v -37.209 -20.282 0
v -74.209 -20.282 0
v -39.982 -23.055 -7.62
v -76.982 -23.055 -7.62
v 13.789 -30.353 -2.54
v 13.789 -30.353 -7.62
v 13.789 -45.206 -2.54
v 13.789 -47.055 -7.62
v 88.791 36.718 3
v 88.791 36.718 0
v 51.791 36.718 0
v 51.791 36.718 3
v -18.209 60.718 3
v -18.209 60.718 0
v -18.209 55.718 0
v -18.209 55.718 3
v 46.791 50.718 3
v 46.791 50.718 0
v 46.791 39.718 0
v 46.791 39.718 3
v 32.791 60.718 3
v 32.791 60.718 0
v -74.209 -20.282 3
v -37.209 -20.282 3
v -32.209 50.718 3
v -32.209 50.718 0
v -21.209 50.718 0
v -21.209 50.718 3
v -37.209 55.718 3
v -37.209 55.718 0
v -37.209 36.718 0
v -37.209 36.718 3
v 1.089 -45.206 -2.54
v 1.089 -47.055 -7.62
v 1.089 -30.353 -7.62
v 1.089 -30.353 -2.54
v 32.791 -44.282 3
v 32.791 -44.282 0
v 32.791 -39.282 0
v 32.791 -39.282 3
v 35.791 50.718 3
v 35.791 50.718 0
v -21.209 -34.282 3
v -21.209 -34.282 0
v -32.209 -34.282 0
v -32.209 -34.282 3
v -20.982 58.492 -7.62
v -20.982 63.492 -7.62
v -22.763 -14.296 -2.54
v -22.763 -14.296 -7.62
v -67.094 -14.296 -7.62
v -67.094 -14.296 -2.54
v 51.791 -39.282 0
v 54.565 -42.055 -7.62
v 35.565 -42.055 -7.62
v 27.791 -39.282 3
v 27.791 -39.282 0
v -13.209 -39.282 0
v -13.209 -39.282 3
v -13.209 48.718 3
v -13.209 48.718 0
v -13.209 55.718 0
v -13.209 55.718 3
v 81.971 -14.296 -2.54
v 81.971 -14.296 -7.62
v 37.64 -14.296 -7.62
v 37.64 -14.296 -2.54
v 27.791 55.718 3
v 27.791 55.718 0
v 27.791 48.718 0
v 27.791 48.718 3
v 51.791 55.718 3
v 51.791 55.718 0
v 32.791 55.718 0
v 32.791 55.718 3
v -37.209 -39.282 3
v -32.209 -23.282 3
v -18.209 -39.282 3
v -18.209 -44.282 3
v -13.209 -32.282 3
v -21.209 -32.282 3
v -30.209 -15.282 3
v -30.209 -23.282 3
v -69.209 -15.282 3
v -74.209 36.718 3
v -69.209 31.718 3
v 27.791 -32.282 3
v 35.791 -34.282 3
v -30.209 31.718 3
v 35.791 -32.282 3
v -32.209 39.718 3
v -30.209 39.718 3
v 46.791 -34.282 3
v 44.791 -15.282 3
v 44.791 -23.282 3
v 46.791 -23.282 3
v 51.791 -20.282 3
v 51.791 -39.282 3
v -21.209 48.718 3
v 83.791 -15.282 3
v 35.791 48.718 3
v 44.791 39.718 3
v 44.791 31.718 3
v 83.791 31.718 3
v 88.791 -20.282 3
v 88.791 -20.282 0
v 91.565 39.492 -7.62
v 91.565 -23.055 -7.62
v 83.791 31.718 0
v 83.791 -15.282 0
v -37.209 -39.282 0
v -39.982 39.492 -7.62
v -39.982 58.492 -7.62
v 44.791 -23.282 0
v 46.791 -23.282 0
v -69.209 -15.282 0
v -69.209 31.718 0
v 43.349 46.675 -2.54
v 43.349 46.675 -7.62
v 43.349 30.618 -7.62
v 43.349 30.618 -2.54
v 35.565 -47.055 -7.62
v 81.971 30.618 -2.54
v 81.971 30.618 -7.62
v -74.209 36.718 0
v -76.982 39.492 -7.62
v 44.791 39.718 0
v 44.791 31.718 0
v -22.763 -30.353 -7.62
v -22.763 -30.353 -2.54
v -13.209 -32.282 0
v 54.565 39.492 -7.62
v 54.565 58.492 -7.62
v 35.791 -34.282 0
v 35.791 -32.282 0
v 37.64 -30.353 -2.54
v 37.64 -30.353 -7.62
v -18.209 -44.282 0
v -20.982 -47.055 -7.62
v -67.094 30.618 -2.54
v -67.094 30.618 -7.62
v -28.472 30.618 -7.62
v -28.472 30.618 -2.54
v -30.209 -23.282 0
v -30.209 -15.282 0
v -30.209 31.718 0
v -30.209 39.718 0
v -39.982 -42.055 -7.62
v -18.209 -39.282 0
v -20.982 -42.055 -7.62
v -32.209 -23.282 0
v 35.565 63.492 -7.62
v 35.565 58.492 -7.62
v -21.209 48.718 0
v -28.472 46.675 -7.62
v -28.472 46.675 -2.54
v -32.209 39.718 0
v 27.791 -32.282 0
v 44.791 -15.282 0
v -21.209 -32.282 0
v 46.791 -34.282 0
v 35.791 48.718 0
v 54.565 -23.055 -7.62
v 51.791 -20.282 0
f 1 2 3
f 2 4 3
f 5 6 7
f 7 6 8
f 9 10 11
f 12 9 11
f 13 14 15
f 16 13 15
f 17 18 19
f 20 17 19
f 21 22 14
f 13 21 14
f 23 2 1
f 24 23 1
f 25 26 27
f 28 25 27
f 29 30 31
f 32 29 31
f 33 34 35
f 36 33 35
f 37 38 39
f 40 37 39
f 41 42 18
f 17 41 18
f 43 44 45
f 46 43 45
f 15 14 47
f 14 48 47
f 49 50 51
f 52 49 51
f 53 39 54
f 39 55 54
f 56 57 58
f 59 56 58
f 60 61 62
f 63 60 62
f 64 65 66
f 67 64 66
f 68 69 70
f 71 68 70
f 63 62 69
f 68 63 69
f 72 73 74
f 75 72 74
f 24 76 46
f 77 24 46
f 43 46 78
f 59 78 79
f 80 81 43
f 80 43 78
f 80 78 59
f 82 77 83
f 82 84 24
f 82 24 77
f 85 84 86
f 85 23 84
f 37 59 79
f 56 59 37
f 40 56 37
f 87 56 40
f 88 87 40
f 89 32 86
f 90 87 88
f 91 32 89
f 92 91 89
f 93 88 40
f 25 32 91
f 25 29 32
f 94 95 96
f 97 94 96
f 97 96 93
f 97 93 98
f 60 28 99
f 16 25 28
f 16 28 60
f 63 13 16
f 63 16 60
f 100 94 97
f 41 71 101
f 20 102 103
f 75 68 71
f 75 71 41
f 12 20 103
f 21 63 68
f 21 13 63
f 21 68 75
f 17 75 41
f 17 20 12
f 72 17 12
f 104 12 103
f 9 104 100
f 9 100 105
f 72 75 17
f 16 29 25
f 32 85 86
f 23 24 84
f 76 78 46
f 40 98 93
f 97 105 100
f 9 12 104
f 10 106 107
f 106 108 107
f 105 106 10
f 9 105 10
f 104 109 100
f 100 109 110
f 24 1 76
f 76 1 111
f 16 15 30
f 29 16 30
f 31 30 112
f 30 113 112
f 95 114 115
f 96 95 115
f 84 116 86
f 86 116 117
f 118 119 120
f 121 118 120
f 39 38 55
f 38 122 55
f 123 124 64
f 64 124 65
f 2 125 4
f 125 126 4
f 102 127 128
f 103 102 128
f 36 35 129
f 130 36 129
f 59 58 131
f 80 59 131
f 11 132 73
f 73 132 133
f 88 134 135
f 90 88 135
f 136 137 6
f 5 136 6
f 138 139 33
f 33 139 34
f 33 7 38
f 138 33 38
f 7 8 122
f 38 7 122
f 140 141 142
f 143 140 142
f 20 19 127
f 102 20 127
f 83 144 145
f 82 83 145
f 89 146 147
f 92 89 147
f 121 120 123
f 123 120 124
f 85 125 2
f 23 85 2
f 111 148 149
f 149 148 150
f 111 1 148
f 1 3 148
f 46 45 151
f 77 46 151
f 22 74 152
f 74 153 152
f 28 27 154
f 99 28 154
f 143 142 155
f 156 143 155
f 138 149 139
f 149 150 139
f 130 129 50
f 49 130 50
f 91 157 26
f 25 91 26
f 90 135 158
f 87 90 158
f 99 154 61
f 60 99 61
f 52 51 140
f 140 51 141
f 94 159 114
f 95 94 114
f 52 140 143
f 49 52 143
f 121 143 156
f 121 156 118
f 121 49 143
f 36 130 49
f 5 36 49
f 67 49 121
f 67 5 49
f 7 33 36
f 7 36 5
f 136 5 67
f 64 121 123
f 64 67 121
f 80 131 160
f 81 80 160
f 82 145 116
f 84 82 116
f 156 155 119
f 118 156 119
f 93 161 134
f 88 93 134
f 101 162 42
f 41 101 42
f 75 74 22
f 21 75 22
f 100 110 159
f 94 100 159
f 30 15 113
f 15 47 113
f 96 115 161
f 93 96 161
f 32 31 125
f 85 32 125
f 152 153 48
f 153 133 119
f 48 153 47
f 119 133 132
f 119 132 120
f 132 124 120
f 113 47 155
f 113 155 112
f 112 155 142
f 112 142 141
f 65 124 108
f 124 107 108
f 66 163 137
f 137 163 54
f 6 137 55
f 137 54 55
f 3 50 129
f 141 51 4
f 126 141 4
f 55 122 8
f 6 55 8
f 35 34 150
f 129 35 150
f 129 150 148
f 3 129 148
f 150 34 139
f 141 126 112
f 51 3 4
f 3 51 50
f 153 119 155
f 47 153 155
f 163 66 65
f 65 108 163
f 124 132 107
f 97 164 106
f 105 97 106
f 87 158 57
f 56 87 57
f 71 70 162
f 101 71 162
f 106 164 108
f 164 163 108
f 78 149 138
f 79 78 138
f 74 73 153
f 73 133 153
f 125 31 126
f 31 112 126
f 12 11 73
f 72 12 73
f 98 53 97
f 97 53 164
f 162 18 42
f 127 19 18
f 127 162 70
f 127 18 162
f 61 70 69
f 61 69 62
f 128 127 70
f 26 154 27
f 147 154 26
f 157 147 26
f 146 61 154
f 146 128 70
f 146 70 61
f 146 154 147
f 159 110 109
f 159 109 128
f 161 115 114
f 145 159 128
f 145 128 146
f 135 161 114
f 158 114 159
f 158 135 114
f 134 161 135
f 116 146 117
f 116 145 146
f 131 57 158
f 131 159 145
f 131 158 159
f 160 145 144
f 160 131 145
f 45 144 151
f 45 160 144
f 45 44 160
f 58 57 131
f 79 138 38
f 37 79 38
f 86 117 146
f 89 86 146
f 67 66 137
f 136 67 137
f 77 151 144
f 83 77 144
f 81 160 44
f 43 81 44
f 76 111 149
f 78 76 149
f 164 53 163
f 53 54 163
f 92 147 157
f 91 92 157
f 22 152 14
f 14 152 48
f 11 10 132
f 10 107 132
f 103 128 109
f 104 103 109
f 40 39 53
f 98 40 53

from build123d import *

# Parameters (mm, degrees)
F1_DEPTH = 3
F2_DEPTH = 7.62
F2_TAPER = -20
F4_DEPTH = 5.08


with BuildPart() as f1:
    # F0 (on Top) → F1 (new body)
    with BuildSketch(Plane.XY):
        Polygon((51.7914976329, 55.718055591), (32.7914976329, 55.718055591), (32.7914976329, 60.718055591), (7.2914976329, 60.718055591), (-18.2085023671, 60.718055591), (-18.2085023671, 55.718055591), (-37.2085023671, 55.718055591), (-37.2085023671, 36.718055591), (-74.2085023671, 36.718055591), (-74.2085023671, 8.218055591), (-74.2085023671, -20.281944409), (-37.2085023671, -20.281944409), (-37.2085023671, -39.281944409), (-18.2085023671, -39.281944409), (-18.2085023671, -44.281944409), (7.2914976329, -44.281944409), (32.7914976329, -44.281944409), (32.7914976329, -39.281944409), (51.7914976329, -39.281944409), (51.7914976329, -20.281944409), (88.7914976329, -20.281944409), (88.7914976329, 8.218055591), (88.7914976329, 36.718055591), (51.7914976329, 36.718055591), align=None)
        Polygon((-69.2085023671, 8.218055591), (-69.2085023671, 31.718055591), (-30.2085023671, 31.718055591), (-30.2085023671, 39.718055591), (-32.2085023671, 39.718055591), (-32.2085023671, 50.718055591), (-21.2085023671, 50.718055591), (-21.2085023671, 48.718055591), (-13.2085023671, 48.718055591), (-13.2085023671, 55.718055591), (7.2914976329, 55.718055591), (27.7914976329, 55.718055591), (27.7914976329, 48.718055591), (35.7914976329, 48.718055591), (35.7914976329, 50.718055591), (46.7914976329, 50.718055591), (46.7914976329, 39.718055591), (44.7914976329, 39.718055591), (44.7914976329, 31.718055591), (83.7914976329, 31.718055591), (83.7914976329, 8.218055591), (83.7914976329, -15.281944409), (44.7914976329, -15.281944409), (44.7914976329, -23.281944409), (46.7914976329, -23.281944409), (46.7914976329, -34.281944409), (35.7914976329, -34.281944409), (35.7914976329, -32.281944409), (27.7914976329, -32.281944409), (27.7914976329, -39.281944409), (7.2914976329, -39.281944409), (-13.2085023671, -39.281944409), (-13.2085023671, -32.281944409), (-21.2085023671, -32.281944409), (-21.2085023671, -34.281944409), (-32.2085023671, -34.281944409), (-32.2085023671, -23.281944409), (-30.2085023671, -23.281944409), (-30.2085023671, -15.281944409), (-69.2085023671, -15.281944409), align=None, mode=Mode.SUBTRACT)
    extrude(amount=F1_DEPTH)

    # F0 (on Top) → F2 (join)
    with BuildSketch(Plane.XY):
        Polygon((51.7914976329, 55.718055591), (32.7914976329, 55.718055591), (32.7914976329, 60.718055591), (7.2914976329, 60.718055591), (-18.2085023671, 60.718055591), (-18.2085023671, 55.718055591), (-37.2085023671, 55.718055591), (-37.2085023671, 36.718055591), (-74.2085023671, 36.718055591), (-74.2085023671, 8.218055591), (-74.2085023671, -20.281944409), (-37.2085023671, -20.281944409), (-37.2085023671, -39.281944409), (-18.2085023671, -39.281944409), (-18.2085023671, -44.281944409), (7.2914976329, -44.281944409), (32.7914976329, -44.281944409), (32.7914976329, -39.281944409), (51.7914976329, -39.281944409), (51.7914976329, -20.281944409), (88.7914976329, -20.281944409), (88.7914976329, 8.218055591), (88.7914976329, 36.718055591), (51.7914976329, 36.718055591), align=None)
        Polygon((-69.2085023671, 8.218055591), (-69.2085023671, 31.718055591), (-30.2085023671, 31.718055591), (-30.2085023671, 39.718055591), (-32.2085023671, 39.718055591), (-32.2085023671, 50.718055591), (-21.2085023671, 50.718055591), (-21.2085023671, 48.718055591), (-13.2085023671, 48.718055591), (-13.2085023671, 55.718055591), (7.2914976329, 55.718055591), (27.7914976329, 55.718055591), (27.7914976329, 48.718055591), (35.7914976329, 48.718055591), (35.7914976329, 50.718055591), (46.7914976329, 50.718055591), (46.7914976329, 39.718055591), (44.7914976329, 39.718055591), (44.7914976329, 31.718055591), (83.7914976329, 31.718055591), (83.7914976329, 8.218055591), (83.7914976329, -15.281944409), (44.7914976329, -15.281944409), (44.7914976329, -23.281944409), (46.7914976329, -23.281944409), (46.7914976329, -34.281944409), (35.7914976329, -34.281944409), (35.7914976329, -32.281944409), (27.7914976329, -32.281944409), (27.7914976329, -39.281944409), (7.2914976329, -39.281944409), (-13.2085023671, -39.281944409), (-13.2085023671, -32.281944409), (-21.2085023671, -32.281944409), (-21.2085023671, -34.281944409), (-32.2085023671, -34.281944409), (-32.2085023671, -23.281944409), (-30.2085023671, -23.281944409), (-30.2085023671, -15.281944409), (-69.2085023671, -15.281944409), align=None, mode=Mode.SUBTRACT)
        Polygon((-30.2085023671, 31.718055591), (-69.2085023671, 31.718055591), (-69.2085023671, 8.218055591), (-69.2085023671, -15.281944409), (-30.2085023671, -15.281944409), (-30.2085023671, -23.281944409), (-32.2085023671, -23.281944409), (-32.2085023671, -34.281944409), (-21.2085023671, -34.281944409), (-21.2085023671, -32.281944409), (-13.2085023671, -32.281944409), (-13.2085023671, -39.281944409), (7.2914976329, -39.281944409), (27.7914976329, -39.281944409), (27.7914976329, -32.281944409), (35.7914976329, -32.281944409), (35.7914976329, -34.281944409), (46.7914976329, -34.281944409), (46.7914976329, -23.281944409), (44.7914976329, -23.281944409), (44.7914976329, -15.281944409), (83.7914976329, -15.281944409), (83.7914976329, 8.218055591), (83.7914976329, 31.718055591), (44.7914976329, 31.718055591), (44.7914976329, 39.718055591), (46.7914976329, 39.718055591), (46.7914976329, 50.718055591), (35.7914976329, 50.718055591), (35.7914976329, 48.718055591), (27.7914976329, 48.718055591), (27.7914976329, 55.718055591), (7.2914976329, 55.718055591), (-13.2085023671, 55.718055591), (-13.2085023671, 48.718055591), (-21.2085023671, 48.718055591), (-21.2085023671, 50.718055591), (-32.2085023671, 50.718055591), (-32.2085023671, 39.718055591), (-30.2085023671, 39.718055591), align=None)
    extrude(amount=-F2_DEPTH, taper=F2_TAPER)

    # F3 (on face) → F4 (cut)
    with BuildSketch(Plane(origin=(0, 0, -7.62), x_dir=(1, 0, 0), z_dir=(0, 0, -1))):
        Polygon((-28.4716319293, 14.2964404076), (-67.0940428972, 14.2964404076), (-67.0940428972, -30.6183788925), (-28.4716319293, -30.6183788925), (-28.4716319293, -46.6748848557), (43.3486886322, -46.6748848557), (43.3486886322, -30.6183788925), (81.9710996002, -30.6183788925), (81.9710996002, 14.2964404076), (43.3486886322, 14.2964404076), (37.6397153199, 14.2964404076), (37.6397153199, 30.3529463708), (13.7885283515, 30.3529463708), (13.7885283515, 47.0553975941), (1.0885283515, 47.0553975941), (1.0885283515, 30.3529463708), (-22.7626586169, 30.3529463708), (-22.7626586169, 14.2964404076), align=None)
    extrude(amount=-F4_DEPTH, mode=Mode.SUBTRACT)


solid = f1.part
